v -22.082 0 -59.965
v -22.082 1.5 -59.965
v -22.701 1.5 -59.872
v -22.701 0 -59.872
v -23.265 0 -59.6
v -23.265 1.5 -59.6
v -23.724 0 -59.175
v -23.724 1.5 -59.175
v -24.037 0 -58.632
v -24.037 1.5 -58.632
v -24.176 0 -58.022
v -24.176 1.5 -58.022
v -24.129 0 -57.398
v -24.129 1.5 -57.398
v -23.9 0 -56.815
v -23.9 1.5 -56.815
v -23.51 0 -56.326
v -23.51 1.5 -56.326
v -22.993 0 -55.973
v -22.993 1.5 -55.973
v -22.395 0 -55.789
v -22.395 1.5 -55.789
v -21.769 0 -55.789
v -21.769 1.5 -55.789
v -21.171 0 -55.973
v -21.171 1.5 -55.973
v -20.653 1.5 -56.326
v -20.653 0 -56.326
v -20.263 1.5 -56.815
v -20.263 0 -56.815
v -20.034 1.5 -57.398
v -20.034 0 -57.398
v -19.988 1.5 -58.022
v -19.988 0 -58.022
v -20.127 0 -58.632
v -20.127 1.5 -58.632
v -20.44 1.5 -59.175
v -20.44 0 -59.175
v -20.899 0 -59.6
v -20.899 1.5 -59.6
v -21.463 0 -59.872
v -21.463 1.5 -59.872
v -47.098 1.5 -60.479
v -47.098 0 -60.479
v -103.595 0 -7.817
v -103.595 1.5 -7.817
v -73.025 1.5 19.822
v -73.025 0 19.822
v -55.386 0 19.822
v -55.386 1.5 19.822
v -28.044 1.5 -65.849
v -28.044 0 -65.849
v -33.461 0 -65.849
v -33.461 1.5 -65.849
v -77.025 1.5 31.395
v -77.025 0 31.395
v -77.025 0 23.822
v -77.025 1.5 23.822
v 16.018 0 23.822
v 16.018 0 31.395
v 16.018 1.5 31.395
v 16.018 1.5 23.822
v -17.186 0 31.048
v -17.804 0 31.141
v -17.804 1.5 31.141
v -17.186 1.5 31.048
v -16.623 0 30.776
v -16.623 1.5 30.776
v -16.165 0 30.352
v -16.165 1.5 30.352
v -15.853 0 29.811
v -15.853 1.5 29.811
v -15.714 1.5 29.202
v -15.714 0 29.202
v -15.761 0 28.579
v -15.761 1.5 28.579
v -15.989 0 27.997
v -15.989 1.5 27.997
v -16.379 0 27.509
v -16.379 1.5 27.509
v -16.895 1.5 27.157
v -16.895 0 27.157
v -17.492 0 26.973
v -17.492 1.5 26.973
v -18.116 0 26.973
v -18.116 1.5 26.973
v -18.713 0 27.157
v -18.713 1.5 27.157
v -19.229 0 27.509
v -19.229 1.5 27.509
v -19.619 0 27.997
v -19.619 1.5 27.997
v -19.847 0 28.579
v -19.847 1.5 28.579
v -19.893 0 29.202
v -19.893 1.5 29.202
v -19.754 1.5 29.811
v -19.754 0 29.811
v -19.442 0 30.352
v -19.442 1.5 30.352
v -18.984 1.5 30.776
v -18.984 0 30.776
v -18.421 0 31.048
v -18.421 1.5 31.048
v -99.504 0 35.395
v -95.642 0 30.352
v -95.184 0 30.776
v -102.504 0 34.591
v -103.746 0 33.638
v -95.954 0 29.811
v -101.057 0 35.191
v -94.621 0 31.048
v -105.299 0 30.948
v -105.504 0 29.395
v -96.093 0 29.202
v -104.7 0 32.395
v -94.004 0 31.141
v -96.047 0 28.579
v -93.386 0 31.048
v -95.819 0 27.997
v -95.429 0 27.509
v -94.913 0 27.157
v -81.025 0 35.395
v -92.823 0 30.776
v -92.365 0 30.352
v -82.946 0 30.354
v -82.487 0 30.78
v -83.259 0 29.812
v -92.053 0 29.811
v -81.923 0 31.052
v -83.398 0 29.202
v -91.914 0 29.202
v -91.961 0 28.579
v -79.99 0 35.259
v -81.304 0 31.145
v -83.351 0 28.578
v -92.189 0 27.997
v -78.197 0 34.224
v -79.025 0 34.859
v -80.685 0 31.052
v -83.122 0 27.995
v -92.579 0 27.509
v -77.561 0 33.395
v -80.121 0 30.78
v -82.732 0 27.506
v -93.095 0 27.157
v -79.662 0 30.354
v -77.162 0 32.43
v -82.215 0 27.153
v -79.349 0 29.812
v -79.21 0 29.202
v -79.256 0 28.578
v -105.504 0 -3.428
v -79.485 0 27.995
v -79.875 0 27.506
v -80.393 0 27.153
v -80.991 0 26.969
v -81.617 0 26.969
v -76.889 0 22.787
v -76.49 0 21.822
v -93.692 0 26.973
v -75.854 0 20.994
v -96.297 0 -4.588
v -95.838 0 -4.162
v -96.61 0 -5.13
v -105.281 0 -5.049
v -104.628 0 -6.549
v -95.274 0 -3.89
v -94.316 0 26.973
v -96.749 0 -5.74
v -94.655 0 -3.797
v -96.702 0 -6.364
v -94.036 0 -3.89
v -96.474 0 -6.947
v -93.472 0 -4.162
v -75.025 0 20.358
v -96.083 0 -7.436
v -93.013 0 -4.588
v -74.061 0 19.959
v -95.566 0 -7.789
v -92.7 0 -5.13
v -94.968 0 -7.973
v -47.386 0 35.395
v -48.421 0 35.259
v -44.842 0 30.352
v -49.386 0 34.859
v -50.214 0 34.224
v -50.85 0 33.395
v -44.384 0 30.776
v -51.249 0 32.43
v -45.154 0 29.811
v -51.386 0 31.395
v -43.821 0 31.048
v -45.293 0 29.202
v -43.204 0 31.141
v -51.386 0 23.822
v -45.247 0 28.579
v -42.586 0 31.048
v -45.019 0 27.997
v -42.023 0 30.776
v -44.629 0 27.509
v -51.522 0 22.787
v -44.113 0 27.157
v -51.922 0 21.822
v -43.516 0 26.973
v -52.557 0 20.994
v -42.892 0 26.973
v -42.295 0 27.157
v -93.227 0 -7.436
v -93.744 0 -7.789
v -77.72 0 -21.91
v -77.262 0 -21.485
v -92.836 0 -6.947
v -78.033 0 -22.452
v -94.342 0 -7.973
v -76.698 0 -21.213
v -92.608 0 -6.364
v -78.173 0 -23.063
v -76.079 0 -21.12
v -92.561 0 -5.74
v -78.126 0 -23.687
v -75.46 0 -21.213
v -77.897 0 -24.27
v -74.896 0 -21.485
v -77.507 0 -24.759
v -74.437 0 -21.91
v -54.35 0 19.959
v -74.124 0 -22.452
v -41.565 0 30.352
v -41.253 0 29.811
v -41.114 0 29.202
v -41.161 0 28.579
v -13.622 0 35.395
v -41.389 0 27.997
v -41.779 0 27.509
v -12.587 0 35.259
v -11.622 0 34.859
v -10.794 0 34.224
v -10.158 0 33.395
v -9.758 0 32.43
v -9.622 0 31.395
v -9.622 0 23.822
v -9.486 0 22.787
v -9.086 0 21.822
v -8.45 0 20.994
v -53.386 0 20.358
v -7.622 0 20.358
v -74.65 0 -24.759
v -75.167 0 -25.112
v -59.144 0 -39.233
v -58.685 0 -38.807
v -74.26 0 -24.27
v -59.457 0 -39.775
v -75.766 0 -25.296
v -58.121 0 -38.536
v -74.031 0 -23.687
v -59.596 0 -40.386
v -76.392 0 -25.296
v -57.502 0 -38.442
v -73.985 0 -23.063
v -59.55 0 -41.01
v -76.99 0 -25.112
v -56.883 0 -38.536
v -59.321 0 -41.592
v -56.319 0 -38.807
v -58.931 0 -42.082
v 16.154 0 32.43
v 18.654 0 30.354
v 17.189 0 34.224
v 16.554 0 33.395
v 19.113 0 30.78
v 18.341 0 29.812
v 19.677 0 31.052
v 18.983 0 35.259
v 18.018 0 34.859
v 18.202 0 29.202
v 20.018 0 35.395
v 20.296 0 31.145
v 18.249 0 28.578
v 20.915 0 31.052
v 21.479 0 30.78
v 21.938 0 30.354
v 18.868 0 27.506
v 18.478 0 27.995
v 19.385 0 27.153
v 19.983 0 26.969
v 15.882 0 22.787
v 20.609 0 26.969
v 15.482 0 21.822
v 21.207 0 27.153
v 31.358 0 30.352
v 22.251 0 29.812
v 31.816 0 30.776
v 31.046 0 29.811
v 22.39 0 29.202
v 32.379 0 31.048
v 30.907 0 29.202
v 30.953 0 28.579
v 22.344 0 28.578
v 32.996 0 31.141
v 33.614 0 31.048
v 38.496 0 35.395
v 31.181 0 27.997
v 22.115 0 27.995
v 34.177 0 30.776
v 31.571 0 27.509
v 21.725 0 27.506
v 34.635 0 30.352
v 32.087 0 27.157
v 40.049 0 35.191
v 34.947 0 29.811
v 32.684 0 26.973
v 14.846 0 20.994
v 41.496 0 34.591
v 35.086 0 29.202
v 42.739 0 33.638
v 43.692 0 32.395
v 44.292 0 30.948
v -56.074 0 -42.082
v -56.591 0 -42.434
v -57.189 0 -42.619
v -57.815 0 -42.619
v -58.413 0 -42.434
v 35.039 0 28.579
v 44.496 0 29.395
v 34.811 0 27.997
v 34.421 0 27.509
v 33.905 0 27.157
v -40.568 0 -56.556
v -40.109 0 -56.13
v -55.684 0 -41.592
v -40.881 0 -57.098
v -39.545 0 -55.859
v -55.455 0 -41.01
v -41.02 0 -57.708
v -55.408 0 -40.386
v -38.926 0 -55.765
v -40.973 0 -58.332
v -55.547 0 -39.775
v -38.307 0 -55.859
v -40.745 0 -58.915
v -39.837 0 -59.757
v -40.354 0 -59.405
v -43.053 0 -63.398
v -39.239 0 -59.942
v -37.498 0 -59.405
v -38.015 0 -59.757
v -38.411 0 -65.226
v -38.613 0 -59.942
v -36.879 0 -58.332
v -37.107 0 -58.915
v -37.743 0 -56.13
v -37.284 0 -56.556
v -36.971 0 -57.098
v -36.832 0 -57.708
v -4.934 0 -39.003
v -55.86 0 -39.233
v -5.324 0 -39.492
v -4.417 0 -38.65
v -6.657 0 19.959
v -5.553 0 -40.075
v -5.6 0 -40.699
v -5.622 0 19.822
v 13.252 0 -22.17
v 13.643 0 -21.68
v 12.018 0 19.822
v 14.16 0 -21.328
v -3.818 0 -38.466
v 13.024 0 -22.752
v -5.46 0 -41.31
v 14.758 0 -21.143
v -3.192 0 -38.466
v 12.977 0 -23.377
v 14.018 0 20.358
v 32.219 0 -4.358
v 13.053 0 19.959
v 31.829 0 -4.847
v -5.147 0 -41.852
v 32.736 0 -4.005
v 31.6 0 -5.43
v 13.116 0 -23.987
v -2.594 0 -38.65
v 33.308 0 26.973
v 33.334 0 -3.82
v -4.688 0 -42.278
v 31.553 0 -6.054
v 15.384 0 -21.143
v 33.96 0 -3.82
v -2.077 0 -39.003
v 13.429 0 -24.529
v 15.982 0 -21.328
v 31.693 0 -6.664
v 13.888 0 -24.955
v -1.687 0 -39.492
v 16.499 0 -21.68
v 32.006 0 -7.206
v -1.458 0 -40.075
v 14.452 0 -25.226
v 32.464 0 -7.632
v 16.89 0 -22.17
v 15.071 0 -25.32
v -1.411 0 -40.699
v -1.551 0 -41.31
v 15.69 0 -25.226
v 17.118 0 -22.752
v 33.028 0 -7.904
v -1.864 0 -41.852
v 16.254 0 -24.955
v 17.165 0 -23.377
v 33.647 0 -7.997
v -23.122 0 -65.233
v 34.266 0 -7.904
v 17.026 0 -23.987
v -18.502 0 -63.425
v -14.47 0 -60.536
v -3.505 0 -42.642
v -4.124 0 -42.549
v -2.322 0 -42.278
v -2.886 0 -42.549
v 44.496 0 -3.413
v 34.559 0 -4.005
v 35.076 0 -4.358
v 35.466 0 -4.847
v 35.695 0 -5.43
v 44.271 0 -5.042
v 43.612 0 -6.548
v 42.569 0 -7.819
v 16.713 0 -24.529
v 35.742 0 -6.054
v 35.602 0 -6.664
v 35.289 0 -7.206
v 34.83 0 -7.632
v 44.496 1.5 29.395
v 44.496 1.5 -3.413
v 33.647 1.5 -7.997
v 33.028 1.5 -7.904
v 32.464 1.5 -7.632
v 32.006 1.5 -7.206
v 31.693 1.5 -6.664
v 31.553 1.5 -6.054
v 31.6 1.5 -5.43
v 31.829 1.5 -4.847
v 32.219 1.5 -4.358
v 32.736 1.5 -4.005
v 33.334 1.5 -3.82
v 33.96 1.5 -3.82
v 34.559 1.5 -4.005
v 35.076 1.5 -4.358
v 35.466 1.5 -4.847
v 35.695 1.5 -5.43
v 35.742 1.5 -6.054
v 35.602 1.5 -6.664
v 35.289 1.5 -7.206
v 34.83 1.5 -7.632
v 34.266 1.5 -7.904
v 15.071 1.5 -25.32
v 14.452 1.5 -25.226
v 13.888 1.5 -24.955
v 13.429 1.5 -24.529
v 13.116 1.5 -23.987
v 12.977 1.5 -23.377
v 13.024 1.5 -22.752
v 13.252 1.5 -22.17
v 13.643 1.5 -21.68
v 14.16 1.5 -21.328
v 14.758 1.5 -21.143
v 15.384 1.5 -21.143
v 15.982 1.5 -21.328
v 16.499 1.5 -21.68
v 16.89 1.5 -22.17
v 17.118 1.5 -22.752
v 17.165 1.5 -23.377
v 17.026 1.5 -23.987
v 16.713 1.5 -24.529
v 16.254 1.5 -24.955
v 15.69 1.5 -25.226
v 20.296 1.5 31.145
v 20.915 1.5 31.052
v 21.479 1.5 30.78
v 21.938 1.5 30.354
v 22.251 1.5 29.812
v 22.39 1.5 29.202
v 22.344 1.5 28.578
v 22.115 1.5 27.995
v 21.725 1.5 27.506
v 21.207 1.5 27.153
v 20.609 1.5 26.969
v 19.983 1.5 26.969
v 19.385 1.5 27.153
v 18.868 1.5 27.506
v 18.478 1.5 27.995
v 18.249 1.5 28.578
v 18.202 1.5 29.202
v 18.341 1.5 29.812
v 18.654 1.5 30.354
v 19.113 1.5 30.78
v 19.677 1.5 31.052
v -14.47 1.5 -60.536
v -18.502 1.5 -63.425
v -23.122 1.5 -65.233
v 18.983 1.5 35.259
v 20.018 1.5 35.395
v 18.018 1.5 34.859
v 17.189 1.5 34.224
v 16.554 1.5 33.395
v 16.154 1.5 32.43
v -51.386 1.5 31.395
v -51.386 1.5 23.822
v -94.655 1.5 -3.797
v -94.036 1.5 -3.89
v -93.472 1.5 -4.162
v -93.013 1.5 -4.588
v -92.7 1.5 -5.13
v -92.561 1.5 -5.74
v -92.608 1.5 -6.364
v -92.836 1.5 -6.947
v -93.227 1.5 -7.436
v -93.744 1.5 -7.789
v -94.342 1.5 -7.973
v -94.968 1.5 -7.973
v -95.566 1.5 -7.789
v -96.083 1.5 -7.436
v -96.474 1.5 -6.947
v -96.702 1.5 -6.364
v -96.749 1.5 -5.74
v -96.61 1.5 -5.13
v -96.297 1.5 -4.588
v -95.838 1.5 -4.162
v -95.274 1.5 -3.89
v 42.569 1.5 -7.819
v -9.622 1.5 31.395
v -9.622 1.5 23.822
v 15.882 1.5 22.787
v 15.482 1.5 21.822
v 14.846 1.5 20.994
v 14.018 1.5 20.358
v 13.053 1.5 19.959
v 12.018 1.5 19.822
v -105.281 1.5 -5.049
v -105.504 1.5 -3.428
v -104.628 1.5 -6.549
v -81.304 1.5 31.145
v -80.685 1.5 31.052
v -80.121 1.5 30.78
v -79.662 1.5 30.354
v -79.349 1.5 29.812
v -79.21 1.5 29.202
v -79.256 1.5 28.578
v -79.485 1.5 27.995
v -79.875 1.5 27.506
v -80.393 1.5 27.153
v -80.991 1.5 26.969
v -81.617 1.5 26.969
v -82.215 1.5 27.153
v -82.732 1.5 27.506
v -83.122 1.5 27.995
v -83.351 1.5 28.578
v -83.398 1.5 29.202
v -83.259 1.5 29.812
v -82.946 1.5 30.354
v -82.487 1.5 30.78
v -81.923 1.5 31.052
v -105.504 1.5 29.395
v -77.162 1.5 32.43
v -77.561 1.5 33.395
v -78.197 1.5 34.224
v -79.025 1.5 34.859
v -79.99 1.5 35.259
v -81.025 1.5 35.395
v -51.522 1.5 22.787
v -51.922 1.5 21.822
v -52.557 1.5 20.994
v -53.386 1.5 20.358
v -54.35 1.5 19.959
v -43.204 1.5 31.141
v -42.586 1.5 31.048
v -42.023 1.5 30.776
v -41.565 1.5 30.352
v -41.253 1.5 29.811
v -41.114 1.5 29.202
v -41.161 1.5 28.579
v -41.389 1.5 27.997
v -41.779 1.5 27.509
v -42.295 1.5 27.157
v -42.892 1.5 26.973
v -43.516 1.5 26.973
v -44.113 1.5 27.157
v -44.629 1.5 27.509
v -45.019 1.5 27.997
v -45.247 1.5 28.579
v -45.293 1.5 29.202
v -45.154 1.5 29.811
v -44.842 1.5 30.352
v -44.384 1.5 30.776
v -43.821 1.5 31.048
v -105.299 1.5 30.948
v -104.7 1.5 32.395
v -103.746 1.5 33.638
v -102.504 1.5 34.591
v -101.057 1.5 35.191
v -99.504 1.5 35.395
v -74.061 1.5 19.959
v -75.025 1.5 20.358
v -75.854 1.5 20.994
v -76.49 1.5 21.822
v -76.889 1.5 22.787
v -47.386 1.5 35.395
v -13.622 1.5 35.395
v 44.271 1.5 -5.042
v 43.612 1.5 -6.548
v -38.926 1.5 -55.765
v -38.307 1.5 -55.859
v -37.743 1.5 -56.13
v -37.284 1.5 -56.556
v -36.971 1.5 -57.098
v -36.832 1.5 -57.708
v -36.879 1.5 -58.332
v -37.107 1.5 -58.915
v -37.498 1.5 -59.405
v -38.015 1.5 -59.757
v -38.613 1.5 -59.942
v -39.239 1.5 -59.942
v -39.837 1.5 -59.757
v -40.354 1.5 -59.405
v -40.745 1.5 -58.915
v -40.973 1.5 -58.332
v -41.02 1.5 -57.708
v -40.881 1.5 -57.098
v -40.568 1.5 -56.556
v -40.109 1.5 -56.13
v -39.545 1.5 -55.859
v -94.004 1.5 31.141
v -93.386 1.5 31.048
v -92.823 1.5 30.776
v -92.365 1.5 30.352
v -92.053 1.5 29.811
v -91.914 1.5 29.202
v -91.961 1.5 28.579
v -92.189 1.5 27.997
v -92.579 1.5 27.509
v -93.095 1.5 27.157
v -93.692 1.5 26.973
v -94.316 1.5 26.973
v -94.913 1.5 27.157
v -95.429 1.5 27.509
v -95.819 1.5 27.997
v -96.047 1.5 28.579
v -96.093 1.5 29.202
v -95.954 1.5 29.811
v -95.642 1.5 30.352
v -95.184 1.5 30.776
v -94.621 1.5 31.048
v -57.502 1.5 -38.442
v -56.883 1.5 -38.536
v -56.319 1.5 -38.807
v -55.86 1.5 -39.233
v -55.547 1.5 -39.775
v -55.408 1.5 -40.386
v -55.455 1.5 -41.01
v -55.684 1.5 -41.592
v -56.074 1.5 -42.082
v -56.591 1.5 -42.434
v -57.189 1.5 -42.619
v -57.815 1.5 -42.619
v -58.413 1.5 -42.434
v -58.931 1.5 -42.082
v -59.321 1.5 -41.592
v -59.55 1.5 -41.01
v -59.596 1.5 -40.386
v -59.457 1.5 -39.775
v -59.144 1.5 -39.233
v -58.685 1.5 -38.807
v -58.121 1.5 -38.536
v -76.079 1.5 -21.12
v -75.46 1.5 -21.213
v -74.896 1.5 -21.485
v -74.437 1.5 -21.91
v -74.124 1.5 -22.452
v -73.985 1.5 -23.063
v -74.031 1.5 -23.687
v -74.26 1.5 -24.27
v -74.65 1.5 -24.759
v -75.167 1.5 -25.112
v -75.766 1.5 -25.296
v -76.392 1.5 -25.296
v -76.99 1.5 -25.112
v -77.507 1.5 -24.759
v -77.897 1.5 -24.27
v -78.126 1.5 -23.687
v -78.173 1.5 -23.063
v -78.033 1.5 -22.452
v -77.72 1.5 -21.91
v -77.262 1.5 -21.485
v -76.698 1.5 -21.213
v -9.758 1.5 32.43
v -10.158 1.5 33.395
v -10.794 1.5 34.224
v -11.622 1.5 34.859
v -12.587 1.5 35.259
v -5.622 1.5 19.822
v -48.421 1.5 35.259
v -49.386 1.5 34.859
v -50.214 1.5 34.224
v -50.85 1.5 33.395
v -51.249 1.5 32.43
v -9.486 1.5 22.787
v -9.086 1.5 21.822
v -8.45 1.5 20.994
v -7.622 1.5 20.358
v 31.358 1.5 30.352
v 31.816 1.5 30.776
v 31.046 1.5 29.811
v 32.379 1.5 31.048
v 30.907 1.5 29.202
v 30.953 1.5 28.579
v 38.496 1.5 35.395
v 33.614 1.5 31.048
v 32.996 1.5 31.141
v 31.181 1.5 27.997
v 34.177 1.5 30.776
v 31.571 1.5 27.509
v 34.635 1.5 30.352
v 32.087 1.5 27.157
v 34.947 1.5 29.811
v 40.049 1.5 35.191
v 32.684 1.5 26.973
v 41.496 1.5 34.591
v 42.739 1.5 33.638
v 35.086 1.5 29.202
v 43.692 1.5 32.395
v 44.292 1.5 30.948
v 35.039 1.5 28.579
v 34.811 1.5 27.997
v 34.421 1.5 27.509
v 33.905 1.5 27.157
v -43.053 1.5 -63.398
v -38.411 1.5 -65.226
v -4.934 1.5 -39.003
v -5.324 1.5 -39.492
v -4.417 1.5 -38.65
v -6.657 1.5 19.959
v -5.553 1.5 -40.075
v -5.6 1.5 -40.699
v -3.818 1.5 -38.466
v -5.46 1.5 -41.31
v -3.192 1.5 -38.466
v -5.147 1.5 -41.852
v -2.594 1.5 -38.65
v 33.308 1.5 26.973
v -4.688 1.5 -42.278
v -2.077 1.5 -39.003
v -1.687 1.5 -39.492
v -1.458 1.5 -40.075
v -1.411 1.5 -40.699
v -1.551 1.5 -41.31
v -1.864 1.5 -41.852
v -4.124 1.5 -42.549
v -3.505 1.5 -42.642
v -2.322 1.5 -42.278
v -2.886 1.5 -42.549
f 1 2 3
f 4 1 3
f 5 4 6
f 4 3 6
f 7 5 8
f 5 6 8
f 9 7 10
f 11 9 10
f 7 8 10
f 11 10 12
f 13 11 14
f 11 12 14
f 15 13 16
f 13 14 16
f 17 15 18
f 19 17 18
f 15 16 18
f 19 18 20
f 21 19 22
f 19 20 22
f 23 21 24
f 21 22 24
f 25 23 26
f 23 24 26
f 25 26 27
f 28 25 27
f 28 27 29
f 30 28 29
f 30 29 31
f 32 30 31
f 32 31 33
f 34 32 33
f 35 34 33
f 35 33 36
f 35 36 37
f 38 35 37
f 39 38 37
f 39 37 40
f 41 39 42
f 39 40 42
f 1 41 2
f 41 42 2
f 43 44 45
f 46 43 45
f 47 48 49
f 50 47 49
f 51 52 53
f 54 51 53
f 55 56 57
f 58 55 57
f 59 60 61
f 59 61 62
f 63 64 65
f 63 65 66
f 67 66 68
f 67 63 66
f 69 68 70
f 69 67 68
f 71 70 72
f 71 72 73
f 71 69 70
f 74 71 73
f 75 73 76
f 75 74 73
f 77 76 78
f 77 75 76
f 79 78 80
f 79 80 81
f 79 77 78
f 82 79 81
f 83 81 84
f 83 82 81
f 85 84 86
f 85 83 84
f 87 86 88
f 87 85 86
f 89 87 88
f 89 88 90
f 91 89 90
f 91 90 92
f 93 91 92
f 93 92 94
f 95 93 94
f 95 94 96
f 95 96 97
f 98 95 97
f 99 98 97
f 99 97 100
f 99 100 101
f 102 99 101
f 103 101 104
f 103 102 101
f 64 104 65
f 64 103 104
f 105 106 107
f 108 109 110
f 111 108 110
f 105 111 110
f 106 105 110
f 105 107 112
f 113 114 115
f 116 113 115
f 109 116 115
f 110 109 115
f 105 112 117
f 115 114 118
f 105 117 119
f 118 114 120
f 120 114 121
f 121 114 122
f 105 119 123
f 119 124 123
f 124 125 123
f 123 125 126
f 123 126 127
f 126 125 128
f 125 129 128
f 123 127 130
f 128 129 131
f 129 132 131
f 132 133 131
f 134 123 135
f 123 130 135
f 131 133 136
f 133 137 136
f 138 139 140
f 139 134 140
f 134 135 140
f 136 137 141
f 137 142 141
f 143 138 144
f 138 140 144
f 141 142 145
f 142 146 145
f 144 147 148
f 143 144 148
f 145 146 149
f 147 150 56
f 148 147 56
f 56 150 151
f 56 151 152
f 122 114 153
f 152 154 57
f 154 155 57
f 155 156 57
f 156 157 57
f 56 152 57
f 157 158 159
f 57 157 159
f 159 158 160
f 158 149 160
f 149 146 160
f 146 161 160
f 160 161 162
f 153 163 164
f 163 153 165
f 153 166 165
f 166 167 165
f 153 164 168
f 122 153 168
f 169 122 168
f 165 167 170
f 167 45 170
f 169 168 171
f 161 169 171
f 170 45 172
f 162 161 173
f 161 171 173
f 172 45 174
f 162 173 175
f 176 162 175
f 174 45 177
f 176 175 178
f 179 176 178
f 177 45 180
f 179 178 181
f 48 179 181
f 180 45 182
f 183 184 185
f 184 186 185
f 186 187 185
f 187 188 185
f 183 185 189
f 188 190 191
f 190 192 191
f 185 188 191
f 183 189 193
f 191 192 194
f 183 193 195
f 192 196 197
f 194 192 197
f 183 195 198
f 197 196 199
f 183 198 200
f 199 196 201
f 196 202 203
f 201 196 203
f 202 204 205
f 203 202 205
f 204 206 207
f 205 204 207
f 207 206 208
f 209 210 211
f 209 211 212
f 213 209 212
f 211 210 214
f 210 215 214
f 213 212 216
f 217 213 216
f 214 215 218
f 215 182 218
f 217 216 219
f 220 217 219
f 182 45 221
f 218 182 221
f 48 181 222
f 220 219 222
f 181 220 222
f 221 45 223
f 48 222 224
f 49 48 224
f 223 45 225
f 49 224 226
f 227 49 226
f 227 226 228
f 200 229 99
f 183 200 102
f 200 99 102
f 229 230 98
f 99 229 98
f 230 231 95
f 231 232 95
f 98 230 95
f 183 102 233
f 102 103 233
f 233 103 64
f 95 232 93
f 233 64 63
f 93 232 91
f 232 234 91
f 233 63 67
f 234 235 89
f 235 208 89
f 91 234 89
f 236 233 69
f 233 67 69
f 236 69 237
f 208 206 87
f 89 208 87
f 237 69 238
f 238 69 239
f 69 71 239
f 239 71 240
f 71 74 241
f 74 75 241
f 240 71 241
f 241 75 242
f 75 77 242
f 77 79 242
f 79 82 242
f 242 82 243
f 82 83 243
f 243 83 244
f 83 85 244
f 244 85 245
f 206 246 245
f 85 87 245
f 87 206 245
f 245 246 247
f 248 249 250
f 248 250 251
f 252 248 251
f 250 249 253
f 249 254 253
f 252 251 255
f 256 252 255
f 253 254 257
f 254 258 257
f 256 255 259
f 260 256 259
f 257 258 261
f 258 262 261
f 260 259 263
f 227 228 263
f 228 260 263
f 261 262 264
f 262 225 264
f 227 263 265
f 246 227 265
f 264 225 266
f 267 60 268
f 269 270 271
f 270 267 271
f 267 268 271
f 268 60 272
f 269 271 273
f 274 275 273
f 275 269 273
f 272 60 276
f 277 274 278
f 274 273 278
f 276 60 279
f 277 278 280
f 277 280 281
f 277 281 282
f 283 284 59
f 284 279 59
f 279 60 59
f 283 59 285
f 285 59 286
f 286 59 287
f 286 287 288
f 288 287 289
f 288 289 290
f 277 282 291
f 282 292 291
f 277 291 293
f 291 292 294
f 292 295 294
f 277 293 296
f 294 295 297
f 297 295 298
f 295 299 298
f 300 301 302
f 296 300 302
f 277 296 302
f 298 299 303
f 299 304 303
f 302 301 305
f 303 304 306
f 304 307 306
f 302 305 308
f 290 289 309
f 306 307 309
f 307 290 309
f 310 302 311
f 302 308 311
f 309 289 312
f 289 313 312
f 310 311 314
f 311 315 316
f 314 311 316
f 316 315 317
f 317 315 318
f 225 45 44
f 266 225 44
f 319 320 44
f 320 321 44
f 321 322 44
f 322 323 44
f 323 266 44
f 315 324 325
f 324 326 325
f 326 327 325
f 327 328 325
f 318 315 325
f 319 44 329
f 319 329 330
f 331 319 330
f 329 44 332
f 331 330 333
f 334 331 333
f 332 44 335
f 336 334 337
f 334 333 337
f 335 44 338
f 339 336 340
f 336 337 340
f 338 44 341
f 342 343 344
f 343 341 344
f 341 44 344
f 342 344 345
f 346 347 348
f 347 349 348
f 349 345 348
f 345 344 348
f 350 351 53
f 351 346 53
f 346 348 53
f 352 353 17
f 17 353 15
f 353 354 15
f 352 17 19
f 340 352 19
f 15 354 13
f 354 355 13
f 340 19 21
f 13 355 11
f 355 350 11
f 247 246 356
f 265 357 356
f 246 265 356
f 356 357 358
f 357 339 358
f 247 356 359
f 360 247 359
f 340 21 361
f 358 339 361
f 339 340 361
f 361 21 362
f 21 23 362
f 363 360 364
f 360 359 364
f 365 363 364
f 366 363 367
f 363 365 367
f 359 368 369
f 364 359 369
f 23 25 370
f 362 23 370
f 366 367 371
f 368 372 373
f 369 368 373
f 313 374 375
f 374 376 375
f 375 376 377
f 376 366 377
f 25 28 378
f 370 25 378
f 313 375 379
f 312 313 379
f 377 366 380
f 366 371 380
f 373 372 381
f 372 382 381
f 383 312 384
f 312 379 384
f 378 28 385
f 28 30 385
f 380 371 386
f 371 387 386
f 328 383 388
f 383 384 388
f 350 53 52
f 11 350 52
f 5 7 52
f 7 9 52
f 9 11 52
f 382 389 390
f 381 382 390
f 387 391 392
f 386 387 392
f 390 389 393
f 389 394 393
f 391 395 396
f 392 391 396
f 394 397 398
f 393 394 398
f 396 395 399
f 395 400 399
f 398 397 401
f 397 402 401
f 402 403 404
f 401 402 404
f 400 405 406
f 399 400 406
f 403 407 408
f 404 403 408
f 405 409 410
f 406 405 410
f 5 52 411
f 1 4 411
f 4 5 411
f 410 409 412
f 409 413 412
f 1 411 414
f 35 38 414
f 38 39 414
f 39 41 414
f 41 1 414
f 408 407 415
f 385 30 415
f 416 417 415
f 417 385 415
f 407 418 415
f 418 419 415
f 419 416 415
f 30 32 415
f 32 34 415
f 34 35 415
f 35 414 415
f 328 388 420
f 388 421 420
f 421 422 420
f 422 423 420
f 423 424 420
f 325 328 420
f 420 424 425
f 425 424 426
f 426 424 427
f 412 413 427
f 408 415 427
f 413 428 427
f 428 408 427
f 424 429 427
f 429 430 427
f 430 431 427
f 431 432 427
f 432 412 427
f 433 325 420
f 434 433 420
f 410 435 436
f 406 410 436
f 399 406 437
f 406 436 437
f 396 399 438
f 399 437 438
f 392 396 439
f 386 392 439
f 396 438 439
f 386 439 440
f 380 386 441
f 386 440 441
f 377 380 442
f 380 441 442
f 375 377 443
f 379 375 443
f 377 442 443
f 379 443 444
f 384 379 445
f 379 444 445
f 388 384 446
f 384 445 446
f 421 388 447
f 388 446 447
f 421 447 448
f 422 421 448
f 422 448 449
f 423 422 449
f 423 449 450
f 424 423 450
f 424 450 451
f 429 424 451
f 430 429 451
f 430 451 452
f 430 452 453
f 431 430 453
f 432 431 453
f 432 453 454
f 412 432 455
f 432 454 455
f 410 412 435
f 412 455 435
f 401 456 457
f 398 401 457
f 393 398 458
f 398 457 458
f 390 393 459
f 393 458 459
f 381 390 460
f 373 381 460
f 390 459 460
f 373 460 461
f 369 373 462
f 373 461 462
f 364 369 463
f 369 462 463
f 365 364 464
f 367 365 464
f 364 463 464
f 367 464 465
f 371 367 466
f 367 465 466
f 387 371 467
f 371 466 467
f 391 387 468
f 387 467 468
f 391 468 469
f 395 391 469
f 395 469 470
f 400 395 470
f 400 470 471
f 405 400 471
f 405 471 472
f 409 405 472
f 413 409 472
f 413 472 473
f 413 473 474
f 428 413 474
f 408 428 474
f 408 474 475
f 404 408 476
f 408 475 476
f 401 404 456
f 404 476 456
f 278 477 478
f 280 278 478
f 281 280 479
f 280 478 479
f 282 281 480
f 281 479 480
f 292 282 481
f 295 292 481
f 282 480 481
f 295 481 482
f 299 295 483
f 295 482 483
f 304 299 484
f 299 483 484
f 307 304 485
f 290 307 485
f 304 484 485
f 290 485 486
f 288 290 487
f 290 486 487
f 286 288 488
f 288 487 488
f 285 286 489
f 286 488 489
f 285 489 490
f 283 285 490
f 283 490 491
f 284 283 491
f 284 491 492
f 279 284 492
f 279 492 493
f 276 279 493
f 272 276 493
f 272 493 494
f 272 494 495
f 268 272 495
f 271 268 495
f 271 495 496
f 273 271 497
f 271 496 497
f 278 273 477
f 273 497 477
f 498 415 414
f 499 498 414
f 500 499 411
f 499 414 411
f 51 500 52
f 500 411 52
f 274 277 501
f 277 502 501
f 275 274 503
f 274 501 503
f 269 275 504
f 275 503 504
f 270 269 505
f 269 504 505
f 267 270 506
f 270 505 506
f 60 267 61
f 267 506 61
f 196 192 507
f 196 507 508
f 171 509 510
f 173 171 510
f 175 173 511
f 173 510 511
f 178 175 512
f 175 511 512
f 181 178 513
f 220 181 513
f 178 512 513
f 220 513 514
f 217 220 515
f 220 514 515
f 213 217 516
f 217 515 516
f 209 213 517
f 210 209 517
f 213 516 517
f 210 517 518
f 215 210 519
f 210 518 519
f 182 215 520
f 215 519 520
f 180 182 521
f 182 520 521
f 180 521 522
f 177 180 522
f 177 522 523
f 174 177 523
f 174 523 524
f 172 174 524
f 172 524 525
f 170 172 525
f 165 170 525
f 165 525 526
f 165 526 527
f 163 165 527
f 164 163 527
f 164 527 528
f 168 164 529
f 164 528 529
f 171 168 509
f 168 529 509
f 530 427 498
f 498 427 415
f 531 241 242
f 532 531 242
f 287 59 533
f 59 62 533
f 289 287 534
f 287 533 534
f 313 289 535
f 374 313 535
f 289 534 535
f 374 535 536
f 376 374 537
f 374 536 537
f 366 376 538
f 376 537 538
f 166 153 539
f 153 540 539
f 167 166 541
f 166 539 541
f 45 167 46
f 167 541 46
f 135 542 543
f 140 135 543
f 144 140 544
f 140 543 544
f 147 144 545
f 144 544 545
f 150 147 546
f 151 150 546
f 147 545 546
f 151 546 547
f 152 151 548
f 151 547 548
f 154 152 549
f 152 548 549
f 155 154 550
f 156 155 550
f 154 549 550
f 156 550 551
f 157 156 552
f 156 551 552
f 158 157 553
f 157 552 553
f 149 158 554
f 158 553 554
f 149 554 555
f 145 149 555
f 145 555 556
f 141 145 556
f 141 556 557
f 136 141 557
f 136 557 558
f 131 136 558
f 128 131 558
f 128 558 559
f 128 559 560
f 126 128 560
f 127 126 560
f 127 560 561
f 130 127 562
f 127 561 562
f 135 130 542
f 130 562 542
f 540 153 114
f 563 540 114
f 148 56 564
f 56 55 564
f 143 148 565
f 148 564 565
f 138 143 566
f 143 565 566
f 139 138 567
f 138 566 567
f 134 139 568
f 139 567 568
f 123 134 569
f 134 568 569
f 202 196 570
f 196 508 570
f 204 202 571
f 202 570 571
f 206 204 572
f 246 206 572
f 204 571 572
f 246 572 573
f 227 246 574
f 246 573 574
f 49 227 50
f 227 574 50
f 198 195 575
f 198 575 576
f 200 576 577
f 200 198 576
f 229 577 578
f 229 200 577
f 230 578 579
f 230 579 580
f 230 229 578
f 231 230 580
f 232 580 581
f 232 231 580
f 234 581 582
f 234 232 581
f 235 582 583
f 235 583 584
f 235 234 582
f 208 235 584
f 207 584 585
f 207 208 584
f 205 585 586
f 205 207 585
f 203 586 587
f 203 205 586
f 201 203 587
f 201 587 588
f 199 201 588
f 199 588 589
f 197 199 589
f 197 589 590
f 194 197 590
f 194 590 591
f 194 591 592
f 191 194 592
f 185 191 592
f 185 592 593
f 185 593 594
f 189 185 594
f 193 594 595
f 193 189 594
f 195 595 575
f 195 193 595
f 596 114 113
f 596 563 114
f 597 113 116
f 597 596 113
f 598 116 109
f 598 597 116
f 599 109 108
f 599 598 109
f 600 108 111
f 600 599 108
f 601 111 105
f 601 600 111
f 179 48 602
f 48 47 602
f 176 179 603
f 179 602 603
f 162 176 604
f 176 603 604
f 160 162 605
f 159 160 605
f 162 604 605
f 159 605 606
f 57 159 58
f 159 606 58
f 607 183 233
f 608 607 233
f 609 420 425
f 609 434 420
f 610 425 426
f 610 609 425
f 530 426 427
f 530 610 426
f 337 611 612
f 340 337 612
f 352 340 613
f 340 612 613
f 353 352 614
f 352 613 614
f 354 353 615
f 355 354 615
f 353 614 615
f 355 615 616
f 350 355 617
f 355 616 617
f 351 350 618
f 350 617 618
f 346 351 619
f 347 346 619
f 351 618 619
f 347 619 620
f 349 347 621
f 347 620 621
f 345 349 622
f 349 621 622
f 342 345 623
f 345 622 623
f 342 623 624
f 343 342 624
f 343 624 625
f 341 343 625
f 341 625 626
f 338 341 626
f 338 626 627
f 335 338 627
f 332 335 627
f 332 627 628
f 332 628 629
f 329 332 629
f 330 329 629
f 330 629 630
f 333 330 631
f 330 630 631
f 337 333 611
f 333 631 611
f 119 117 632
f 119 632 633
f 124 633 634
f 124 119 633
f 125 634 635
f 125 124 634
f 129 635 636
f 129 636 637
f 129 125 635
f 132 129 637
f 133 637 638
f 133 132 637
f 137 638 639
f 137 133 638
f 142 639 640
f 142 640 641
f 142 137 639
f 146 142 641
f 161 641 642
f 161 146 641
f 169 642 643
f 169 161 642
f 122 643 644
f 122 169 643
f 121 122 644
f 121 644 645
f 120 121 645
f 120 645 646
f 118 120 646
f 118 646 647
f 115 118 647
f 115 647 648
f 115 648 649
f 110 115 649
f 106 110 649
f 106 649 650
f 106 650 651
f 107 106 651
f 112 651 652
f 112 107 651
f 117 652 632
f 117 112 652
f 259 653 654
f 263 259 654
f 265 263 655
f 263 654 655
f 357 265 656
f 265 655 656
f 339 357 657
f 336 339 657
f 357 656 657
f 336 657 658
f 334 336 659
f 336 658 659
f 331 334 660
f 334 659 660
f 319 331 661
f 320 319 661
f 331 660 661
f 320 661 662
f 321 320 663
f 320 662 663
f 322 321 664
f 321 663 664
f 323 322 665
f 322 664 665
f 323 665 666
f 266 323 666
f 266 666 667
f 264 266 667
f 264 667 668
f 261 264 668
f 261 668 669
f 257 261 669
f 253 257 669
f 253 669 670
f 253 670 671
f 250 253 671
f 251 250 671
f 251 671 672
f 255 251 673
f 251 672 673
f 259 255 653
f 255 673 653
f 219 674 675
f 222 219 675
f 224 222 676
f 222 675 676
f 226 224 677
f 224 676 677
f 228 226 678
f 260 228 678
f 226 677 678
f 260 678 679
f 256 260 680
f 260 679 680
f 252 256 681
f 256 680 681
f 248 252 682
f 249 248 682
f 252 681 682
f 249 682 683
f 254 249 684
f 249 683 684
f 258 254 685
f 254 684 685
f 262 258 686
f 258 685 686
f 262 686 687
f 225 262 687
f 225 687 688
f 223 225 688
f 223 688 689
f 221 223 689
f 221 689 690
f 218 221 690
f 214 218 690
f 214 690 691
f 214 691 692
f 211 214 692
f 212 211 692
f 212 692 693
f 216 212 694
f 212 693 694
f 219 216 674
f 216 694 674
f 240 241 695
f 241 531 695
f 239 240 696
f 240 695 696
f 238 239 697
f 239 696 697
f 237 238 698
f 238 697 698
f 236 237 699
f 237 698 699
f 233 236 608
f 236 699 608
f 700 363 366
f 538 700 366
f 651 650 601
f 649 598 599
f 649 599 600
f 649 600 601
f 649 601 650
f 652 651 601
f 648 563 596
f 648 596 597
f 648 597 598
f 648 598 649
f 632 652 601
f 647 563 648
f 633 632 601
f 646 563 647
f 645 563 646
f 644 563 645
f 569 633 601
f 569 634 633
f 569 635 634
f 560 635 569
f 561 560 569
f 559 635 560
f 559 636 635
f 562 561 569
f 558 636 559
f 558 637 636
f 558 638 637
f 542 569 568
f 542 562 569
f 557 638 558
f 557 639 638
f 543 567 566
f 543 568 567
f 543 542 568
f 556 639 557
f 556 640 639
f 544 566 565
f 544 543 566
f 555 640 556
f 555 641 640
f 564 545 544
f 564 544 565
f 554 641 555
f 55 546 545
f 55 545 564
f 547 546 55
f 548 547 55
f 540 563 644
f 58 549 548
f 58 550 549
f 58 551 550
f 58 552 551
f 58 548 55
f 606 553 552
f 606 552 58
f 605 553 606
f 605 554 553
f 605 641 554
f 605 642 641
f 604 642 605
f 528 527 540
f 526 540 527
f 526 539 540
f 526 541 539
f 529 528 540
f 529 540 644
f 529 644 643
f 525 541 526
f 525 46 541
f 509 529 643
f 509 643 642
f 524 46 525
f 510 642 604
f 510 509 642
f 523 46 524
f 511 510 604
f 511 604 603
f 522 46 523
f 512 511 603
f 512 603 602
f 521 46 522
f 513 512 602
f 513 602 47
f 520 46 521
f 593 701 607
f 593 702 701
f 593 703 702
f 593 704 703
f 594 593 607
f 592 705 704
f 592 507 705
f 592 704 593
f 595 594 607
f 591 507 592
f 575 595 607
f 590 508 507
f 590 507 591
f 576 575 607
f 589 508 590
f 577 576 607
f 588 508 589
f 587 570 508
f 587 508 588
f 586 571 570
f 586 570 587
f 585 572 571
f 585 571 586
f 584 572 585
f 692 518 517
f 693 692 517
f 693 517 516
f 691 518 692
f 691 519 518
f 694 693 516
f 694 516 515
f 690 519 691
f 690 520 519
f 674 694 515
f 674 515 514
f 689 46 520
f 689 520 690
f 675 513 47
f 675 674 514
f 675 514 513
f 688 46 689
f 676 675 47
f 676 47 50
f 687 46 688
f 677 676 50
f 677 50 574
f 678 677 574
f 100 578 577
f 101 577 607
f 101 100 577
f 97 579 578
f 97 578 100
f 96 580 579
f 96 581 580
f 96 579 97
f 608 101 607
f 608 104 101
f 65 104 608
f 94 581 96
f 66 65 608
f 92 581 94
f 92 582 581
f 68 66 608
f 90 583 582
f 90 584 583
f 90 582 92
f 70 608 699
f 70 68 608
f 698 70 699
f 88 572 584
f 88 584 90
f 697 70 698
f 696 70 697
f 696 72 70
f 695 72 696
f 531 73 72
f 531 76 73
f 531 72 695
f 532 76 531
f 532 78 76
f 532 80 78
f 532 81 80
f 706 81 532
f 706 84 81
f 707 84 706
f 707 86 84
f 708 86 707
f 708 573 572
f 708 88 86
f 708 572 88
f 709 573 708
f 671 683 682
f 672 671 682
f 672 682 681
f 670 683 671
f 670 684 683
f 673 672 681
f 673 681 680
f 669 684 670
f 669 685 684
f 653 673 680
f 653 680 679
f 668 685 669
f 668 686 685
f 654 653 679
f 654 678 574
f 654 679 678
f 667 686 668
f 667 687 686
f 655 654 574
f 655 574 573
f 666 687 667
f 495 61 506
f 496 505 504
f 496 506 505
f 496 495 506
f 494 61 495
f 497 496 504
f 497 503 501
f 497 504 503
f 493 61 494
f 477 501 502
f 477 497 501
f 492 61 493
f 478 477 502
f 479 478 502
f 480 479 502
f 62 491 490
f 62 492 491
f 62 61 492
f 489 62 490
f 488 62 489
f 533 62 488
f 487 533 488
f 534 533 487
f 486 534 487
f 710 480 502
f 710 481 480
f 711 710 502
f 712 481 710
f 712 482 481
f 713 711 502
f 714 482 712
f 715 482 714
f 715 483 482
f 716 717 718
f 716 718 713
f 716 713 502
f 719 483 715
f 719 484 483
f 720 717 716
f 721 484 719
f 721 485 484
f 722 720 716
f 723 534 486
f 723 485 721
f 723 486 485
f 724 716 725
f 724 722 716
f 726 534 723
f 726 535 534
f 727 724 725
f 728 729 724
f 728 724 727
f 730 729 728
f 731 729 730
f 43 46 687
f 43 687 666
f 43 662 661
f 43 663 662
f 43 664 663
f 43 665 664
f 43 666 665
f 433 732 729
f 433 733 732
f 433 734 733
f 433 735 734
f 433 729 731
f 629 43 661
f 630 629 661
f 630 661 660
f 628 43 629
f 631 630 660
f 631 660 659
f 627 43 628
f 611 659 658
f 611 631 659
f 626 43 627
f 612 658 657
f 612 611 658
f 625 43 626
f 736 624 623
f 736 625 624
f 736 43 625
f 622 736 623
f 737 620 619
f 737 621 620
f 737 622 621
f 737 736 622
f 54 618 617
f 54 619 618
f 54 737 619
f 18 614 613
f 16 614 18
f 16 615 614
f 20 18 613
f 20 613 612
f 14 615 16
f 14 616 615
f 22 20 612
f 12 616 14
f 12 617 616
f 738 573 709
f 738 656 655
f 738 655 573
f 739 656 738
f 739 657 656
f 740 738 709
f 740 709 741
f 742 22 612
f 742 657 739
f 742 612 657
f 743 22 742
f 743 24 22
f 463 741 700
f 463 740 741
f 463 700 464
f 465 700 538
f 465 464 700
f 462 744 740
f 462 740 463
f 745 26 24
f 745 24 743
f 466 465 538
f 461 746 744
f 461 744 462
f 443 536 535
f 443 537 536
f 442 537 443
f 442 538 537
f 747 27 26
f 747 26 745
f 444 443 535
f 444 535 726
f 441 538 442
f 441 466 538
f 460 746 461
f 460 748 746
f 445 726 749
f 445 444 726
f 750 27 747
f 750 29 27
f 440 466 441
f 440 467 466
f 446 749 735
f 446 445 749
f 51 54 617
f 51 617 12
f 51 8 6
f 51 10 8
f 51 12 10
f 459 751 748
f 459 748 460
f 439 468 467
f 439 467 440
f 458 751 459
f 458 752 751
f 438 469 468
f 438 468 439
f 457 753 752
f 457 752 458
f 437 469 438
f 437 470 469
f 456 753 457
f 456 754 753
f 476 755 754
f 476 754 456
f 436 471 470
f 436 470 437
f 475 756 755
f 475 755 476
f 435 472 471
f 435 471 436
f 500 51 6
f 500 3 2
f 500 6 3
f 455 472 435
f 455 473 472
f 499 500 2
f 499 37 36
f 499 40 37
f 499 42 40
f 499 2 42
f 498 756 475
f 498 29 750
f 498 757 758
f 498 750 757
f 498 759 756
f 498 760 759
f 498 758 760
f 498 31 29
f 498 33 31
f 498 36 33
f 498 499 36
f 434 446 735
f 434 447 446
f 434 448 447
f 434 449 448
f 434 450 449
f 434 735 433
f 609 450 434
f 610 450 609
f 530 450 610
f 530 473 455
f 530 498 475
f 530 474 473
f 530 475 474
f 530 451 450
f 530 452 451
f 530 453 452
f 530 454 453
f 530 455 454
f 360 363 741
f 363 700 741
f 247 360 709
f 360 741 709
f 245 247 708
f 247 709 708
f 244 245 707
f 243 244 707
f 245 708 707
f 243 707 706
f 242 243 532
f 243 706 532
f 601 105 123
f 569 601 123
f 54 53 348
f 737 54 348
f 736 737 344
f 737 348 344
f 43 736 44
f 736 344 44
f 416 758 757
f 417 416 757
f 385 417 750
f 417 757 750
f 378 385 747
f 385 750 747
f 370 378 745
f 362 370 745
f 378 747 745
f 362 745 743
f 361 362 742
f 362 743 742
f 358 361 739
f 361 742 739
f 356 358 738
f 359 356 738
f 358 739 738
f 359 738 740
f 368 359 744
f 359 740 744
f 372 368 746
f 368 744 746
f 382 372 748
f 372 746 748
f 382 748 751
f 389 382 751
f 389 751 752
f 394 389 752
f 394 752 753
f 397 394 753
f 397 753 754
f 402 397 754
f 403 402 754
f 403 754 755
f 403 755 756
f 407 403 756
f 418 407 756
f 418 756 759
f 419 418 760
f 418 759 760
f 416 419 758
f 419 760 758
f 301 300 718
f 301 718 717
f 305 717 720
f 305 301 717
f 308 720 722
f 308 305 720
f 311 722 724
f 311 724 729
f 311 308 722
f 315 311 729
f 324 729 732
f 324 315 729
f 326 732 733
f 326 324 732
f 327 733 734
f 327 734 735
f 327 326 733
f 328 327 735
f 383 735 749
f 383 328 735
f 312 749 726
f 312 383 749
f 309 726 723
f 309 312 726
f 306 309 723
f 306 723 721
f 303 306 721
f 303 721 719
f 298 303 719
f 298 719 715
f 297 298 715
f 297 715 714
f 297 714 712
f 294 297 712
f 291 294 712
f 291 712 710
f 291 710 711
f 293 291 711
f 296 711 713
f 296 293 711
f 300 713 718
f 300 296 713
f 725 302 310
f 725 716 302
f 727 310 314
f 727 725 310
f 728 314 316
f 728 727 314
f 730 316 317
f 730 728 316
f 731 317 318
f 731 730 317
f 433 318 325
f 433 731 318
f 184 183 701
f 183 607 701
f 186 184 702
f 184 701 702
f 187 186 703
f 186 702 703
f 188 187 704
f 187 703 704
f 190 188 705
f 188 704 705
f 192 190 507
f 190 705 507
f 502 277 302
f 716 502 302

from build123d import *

# Parameters (mm, degrees)
SKETCH_1_R          = 2.0955
EXTRUDE_1_DEPTH     = 1.5
SKETCH_2_R          = 2.1
CUT_EXTRUDE_1_DEPTH = 1.5
FILLET_1_R          = 6
CUT_EXTRUDE_START   = -1.5
SKETCH_3_W          = 25.639754975
SKETCH_3_H          = 15.572778706
SKETCH_3_R          = 2.0955
CUT_EXTRUDE_3_DEPTH = 1.5
FILLET_2_R          = 4


with BuildPart() as part:
    # 草图1 → 凸台-拉伸1 (new body)
    with BuildSketch(Plane(origin=(0, 0, 0), x_dir=(1, 0, 0), z_dir=(0, 1, 0))):
        with BuildLine():
            Line((-105.503818672, 6.037520304), (-105.503818672, -35.395112744))
            Line((-105.503818672, -35.395112744), (44.496181328, -35.395112744))
            Line((44.496181328, -35.395112744), (44.496181328, 6.037520304))
            Line((44.496181328, 6.037520304), (-14.469645921, 60.536135507))
            ThreePointArc((-14.469645921, 60.536135507), (-20.755816559, 64.47318161), (-28.044474141, 65.848588442))
            Line((-28.044474141, 65.848588442), (-33.461010911, 65.848588442))
            ThreePointArc((-33.461010911, 65.848588442), (-40.789042153, 64.457724857), (-47.097844214, 60.478584254))
            Line((-47.097844214, 60.478584254), (-105.503818672, 6.037520304))
        make_face()
        with Locations(Location((-94.003818672, -29.045112744, 0), (0, 0, 270))):
            Circle(SKETCH_1_R, mode=Mode.SUBTRACT)
        with Locations(Location((32.996181328, -29.045112744, 0), (0, 0, 270))):
            Circle(SKETCH_1_R, mode=Mode.SUBTRACT)
        with Locations(Location((-68.603818672, -29.045112744, 0), (0, 0, 270))):
            Circle(SKETCH_1_R, mode=Mode.SUBTRACT)
        with Locations(Location((-43.203818672, -29.045112744, 0), (0, 0, 270))):
            Circle(SKETCH_1_R, mode=Mode.SUBTRACT)
        with Locations(Location((-17.803818672, -29.045112744, 0), (0, 0, 270))):
            Circle(SKETCH_1_R, mode=Mode.SUBTRACT)
        with Locations(Location((7.596181328, -29.045112744, 0), (0, 0, 270))):
            Circle(SKETCH_1_R, mode=Mode.SUBTRACT)
    extrude(amount=EXTRUDE_1_DEPTH)

    # 草图2 → 切除-拉伸1 (cut)
    with BuildSketch(Plane(origin=(0, 1.5, 0), x_dir=(1, 0, 0), z_dir=(0, 1, 0))):
        with Locations(Location((-81.303818672, -29.045112744, 0), (0, 0, 270))):
            Circle(SKETCH_2_R)
        with Locations(Location((20.296181328, -29.045112744, 0), (0, 0, 270))):
            Circle(SKETCH_2_R)
        with Locations(Location((-94.655027928, 5.896929075, 0), (0, 0, 270))):
            Circle(SKETCH_2_R)
        with Locations(Location((-76.078643907, 23.219687421, 0), (0, 0, 270))):
            Circle(SKETCH_2_R)
        with Locations(Location((-57.502259886, 40.542445766, 0), (0, 0, 270))):
            Circle(SKETCH_2_R)
        with Locations(Location((-38.925875865, 57.865204112, 0), (0, 0, 270))):
            Circle(SKETCH_2_R)
        with Locations(Location((33.647390585, 5.896929075, 0), (0, 0, 90))):
            Circle(SKETCH_2_R)
        with Locations(Location((15.071006563, 23.219687421, 0), (0, 0, 90))):
            Circle(SKETCH_2_R)
        with Locations(Location((-3.505377458, 40.542445766, 0), (0, 0, 90))):
            Circle(SKETCH_2_R)
        with Locations(Location((-22.081761479, 57.865204112, 0), (0, 0, 90))):
            Circle(SKETCH_2_R)
    extrude(amount=-CUT_EXTRUDE_1_DEPTH, mode=Mode.SUBTRACT)

    # 圆角1
    fillet_1_edges = [part.edges().sort_by_distance(p)[0] for p in [
        (44.496181328, 0.75, -6.037520304),
        (44.496181328, 0.75, 35.395112744),
        (-105.503818672, 0.75, 35.395112744),
        (-105.503818672, 0.75, -6.037520304),
    ]]
    fillet(fillet_1_edges, radius=FILLET_1_R)

    # 草图3 → 切除-拉伸3 (cut)
    # profile 1 of 2: a face of its own
    with BuildSketch(Plane(origin=(0, 1.5, 0), x_dir=(1, 0, 0), z_dir=(0, 1, 0)).offset(CUT_EXTRUDE_START)):
        with Locations((-64.205559978, -27.608723391)):
            Rectangle(SKETCH_3_W, SKETCH_3_H)
        with Locations((-68.603818672, -29.045112744)):
            Circle(SKETCH_3_R, mode=Mode.SUBTRACT)
    # profile 2 of 2: a face of its own
    with BuildSketch(Plane(origin=(0, 1.5, 0), x_dir=(1, 0, 0), z_dir=(0, 1, 0)).offset(CUT_EXTRUDE_START)):
        with Locations((3.197922635, -27.608723391)):
            Rectangle(SKETCH_3_W, SKETCH_3_H)
        with Locations((7.596181328, -29.045112744)):
            Circle(SKETCH_3_R, mode=Mode.SUBTRACT)
    extrude(amount=CUT_EXTRUDE_3_DEPTH, mode=Mode.SUBTRACT)

    # 圆角2
    fillet_2_edges = [part.edges().sort_by_distance(p)[0] for p in [
        (-51.38568249, 0.75, 35.395112744),
        (-77.025437465, 0.75, 35.395112744),
        (-77.025437465, 0.75, 19.822334038),
        (-51.38568249, 0.75, 19.822334038),
        (16.017800122, 0.75, 35.395112744),
        (-9.621954853, 0.75, 35.395112744),
        (-9.621954853, 0.75, 19.822334038),
        (16.017800122, 0.75, 19.822334038),
    ]]
    fillet(fillet_2_edges, radius=FILLET_2_R)


solid = part.part
